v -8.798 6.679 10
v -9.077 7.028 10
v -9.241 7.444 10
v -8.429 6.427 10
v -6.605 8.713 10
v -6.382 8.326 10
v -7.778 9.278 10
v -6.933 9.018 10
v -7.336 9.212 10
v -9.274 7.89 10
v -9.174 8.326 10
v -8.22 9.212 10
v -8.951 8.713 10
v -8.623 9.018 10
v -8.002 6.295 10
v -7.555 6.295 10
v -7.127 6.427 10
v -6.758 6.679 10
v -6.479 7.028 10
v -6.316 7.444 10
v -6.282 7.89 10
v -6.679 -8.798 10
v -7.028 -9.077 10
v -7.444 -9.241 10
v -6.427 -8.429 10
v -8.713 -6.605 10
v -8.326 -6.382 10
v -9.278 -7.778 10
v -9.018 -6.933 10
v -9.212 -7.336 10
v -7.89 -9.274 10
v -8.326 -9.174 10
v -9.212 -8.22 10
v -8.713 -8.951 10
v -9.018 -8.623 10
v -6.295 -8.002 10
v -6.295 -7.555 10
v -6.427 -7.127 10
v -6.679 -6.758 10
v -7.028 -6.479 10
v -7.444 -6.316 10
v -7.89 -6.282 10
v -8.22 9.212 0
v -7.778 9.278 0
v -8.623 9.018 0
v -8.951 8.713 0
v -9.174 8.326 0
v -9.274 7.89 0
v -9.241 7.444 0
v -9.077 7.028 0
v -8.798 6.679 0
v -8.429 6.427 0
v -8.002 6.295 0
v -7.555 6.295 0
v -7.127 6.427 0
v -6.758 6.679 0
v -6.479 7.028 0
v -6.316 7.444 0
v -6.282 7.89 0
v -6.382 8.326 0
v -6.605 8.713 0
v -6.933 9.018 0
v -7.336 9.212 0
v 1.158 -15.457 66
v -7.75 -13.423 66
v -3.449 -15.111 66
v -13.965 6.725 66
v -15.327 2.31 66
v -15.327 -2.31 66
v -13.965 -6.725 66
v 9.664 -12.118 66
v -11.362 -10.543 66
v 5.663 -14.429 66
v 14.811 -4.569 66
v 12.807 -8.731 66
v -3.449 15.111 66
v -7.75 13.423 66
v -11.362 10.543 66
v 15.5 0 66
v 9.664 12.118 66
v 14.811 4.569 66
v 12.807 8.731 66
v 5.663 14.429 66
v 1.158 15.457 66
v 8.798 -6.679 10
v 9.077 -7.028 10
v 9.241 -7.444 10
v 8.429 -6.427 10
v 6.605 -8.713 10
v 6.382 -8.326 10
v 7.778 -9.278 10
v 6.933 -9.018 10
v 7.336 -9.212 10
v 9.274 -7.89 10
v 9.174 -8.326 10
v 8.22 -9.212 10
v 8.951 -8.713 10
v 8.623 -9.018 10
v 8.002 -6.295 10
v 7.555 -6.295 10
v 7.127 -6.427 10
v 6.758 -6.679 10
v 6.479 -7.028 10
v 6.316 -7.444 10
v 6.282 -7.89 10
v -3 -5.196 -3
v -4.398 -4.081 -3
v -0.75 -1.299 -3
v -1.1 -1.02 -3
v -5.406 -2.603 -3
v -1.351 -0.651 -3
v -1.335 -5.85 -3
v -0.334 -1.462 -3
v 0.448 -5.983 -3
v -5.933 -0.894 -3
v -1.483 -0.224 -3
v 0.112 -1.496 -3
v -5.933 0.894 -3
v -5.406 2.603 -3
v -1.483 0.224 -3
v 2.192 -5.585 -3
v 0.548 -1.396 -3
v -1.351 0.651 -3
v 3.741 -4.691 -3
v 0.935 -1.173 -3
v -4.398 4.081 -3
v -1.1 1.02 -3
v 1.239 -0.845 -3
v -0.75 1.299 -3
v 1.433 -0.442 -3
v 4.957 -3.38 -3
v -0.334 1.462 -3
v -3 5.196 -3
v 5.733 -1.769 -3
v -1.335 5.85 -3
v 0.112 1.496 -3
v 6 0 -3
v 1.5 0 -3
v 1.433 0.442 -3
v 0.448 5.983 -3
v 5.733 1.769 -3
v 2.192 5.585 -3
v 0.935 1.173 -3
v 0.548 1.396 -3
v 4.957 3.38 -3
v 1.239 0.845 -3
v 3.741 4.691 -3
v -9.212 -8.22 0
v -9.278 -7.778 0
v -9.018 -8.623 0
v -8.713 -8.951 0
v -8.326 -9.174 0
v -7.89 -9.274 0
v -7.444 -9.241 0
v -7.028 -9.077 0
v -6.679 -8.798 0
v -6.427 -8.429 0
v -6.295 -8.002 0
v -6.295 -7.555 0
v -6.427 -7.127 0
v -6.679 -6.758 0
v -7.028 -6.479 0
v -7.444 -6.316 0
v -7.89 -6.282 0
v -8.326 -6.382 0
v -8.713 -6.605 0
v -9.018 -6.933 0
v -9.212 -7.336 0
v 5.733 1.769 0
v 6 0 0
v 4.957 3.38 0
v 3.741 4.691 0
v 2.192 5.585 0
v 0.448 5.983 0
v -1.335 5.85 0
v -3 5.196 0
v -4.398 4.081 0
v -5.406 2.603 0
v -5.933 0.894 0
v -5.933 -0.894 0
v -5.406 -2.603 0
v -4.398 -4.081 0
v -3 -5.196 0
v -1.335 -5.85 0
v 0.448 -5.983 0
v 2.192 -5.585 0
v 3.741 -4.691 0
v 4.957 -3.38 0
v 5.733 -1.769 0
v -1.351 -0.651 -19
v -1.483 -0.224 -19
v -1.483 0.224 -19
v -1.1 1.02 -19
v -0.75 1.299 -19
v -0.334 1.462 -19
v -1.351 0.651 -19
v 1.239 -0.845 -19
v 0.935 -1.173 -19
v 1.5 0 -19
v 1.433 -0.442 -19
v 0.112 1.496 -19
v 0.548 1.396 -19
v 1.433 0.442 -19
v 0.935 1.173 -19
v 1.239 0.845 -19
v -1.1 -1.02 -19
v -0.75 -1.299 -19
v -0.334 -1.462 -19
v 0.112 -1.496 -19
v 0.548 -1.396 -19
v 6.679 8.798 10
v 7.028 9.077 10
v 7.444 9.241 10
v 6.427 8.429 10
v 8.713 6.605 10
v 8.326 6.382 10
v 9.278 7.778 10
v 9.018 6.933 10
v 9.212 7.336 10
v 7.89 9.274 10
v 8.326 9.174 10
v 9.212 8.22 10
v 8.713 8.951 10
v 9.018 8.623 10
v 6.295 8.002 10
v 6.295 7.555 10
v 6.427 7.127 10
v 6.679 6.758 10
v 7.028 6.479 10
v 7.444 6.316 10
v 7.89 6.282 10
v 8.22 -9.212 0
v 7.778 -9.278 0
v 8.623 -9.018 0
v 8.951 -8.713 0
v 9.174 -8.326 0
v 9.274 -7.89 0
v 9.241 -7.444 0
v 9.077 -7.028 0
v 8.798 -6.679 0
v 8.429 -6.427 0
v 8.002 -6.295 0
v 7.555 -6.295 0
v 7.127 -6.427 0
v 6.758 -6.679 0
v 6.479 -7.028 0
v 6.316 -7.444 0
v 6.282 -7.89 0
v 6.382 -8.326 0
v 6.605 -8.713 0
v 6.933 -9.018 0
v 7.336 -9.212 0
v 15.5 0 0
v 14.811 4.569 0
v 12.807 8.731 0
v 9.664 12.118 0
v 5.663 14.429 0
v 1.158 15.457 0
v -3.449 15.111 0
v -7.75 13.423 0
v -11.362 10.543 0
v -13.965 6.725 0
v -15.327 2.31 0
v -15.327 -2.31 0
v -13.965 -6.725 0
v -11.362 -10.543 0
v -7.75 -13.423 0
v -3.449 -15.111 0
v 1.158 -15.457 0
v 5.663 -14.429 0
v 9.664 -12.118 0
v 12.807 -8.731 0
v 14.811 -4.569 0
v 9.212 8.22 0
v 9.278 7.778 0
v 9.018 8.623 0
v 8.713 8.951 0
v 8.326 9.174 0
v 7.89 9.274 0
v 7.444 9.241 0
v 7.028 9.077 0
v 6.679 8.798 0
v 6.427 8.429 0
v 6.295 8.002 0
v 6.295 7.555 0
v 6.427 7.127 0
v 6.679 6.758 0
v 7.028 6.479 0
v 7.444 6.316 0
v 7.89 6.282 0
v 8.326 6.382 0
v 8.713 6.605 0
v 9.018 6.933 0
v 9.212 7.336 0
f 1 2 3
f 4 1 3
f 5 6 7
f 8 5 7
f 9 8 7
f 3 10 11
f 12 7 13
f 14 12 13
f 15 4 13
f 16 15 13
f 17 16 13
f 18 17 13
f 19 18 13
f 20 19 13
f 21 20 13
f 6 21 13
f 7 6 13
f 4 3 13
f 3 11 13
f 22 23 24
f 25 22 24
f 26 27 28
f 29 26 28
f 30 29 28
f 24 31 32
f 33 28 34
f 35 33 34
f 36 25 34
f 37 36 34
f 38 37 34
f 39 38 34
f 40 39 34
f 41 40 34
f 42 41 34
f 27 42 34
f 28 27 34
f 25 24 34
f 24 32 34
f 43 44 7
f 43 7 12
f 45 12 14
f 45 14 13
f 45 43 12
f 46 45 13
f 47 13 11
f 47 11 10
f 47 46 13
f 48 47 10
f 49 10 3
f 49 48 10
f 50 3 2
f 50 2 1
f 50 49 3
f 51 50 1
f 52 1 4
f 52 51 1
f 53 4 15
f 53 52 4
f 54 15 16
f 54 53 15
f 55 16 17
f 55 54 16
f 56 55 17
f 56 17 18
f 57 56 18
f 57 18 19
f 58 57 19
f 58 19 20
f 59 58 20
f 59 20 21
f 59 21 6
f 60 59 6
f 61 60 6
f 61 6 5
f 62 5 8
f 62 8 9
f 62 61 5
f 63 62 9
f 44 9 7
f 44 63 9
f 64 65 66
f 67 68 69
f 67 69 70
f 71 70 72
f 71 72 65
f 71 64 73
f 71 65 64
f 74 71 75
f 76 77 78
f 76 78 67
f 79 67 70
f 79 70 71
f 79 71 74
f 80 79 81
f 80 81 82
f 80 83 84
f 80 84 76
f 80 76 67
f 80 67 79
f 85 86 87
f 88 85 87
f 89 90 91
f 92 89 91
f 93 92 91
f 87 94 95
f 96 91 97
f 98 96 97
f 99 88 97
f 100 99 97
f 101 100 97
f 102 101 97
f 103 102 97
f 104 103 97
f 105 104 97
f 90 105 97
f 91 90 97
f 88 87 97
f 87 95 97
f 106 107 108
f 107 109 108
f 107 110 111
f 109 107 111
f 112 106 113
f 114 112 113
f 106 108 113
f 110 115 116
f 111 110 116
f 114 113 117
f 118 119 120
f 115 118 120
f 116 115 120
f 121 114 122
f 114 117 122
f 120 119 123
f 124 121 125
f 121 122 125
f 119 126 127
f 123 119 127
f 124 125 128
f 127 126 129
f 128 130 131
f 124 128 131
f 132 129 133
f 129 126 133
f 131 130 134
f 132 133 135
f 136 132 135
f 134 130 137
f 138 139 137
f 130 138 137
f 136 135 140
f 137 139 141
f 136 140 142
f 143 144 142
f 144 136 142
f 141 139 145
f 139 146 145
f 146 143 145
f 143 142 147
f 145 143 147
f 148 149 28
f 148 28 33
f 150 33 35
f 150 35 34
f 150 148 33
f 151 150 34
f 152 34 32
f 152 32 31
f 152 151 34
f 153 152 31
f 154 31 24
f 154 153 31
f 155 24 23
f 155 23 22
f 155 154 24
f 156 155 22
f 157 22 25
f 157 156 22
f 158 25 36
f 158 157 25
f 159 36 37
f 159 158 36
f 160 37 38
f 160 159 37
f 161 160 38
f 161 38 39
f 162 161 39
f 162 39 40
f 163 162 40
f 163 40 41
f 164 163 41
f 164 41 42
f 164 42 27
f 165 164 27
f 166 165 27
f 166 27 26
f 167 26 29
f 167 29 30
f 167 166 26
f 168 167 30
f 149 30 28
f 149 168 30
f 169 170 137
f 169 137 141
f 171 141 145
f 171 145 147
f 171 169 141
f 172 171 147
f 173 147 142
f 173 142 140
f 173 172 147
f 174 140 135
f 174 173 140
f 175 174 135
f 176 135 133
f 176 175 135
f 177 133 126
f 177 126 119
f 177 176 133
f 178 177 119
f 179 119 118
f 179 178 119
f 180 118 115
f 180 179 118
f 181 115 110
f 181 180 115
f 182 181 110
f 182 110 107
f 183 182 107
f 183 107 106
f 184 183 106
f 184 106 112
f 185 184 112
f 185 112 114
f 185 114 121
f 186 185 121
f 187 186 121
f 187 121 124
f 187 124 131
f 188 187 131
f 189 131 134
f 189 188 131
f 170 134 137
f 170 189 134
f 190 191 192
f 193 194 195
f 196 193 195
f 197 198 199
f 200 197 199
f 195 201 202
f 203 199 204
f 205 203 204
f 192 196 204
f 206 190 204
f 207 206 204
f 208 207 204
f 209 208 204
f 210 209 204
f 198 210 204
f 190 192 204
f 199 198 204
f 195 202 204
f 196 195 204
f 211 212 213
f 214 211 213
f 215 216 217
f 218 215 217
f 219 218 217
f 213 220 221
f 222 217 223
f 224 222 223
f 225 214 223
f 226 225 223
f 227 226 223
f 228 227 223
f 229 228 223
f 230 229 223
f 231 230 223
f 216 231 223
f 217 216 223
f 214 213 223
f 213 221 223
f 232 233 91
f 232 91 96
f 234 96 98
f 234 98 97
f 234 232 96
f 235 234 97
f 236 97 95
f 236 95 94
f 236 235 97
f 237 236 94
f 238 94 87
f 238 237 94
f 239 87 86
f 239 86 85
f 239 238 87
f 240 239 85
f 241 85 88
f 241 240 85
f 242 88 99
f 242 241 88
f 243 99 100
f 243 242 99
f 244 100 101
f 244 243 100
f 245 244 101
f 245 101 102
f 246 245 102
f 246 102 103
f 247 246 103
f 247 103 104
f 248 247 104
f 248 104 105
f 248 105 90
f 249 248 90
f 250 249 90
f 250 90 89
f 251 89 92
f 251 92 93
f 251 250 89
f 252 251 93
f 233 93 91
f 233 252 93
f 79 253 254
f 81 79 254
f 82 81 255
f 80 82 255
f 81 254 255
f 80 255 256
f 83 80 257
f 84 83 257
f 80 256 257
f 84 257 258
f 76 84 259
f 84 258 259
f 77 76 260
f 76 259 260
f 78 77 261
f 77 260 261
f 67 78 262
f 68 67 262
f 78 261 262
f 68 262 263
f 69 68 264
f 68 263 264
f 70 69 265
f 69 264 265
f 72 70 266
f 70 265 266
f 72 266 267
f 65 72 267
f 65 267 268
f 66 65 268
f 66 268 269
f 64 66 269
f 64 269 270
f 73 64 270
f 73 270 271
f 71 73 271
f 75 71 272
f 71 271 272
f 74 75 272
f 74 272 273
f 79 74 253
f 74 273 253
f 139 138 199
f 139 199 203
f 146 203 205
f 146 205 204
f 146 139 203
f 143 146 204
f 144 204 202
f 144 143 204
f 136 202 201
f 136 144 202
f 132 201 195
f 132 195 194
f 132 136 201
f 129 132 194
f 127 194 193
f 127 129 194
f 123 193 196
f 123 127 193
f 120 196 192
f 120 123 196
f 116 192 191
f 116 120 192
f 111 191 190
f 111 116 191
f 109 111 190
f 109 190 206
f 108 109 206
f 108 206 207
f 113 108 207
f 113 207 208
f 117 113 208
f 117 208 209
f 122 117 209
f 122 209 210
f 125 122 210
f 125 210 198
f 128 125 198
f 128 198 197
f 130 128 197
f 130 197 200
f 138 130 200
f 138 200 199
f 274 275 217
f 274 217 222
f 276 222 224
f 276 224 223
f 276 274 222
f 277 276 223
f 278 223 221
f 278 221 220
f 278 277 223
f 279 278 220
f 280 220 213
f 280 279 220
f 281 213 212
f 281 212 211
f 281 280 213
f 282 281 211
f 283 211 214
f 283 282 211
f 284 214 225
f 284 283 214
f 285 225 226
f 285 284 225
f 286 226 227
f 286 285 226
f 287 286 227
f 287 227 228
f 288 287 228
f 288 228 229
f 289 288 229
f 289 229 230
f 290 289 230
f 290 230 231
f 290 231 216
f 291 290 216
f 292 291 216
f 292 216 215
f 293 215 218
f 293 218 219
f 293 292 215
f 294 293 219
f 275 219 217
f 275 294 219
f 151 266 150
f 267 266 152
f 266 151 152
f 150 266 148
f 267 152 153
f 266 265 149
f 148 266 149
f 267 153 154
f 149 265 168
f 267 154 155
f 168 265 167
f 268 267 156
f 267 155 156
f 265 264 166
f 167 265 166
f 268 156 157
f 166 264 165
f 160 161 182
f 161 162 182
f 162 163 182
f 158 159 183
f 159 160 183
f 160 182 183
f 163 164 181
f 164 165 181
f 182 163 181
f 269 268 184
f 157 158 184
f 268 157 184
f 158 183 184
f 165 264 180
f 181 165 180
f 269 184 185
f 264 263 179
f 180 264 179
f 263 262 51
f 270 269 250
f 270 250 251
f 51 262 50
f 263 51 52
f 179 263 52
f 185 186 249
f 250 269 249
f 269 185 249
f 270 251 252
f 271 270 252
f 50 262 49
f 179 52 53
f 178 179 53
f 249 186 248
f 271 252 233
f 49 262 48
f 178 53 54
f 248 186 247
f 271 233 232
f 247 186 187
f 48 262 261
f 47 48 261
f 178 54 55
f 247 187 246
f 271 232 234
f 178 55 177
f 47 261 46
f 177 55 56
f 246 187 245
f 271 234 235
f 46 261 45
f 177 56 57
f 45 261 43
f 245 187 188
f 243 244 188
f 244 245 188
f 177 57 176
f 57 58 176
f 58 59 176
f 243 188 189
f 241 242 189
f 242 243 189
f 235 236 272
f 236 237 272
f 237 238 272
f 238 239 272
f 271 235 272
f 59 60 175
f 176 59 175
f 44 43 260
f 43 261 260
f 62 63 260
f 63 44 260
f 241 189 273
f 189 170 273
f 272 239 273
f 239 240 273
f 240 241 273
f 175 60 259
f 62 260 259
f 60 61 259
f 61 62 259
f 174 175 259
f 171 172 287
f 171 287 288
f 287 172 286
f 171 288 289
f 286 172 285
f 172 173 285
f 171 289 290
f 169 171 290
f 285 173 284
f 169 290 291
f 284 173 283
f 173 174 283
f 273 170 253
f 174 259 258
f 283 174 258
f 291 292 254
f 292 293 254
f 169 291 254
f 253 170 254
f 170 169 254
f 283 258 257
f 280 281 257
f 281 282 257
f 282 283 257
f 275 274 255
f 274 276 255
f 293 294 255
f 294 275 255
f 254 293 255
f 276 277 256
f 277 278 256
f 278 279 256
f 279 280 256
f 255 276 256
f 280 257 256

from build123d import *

# Parameters (mm, degrees)
F0_R            = 1.5
F1_DEPTH        = 19
F0_R_2          = 6
F2_DEPTH        = 3
F0_R_3          = 15.5
F3_DEPTH        = 66
F4_DEPTH        = 10
F4_COPIES_COUNT = 4


# Not quite as in the source:
# - a pattern or mirror of a feature is missing from the dataset's text; its kind, count and spacing are read off the source's solid


with BuildPart() as f1:
    # F0 (on Top) → F1 (new body)
    with BuildSketch(Plane.XY):
        Circle(F0_R)
    extrude(amount=-F1_DEPTH)

    # F0 (on Top) → F2 (join)
    with BuildSketch(Plane.XY):
        Circle(F0_R_2)
        Circle(F0_R, mode=Mode.SUBTRACT)
    extrude(amount=-F2_DEPTH)

    # F0 (on Top) → F3 (join)
    with BuildSketch(Plane.XY):
        Circle(F0_R_3)
        Circle(F0_R_2, mode=Mode.SUBTRACT)
        with Locations((7.7781745931, 7.7781745931)):
            Circle(F0_R, mode=Mode.SUBTRACT)
        Circle(F0_R_2)
        Circle(F0_R, mode=Mode.SUBTRACT)
        Circle(F0_R)
        with Locations((7.7781745931, 7.7781745931)):
            Circle(F0_R)
    extrude(amount=F3_DEPTH)

    # F0 (on Top) → F4 (cut)
    with BuildSketch(Plane.XY):
        with Locations((7.7781745931, 7.7781745931)):
            Circle(F0_R)
    f4 = extrude(amount=F4_DEPTH, mode=Mode.SUBTRACT)

    # F4_copies: F4 ×4 about axis
    f4_copies_axis = Axis((0, 0, 0), (0, 0, 1))
    for i in range(1, F4_COPIES_COUNT):
        add(f4.rotate(f4_copies_axis, i * 360 / F4_COPIES_COUNT), mode=Mode.SUBTRACT)


solid = f1.part
